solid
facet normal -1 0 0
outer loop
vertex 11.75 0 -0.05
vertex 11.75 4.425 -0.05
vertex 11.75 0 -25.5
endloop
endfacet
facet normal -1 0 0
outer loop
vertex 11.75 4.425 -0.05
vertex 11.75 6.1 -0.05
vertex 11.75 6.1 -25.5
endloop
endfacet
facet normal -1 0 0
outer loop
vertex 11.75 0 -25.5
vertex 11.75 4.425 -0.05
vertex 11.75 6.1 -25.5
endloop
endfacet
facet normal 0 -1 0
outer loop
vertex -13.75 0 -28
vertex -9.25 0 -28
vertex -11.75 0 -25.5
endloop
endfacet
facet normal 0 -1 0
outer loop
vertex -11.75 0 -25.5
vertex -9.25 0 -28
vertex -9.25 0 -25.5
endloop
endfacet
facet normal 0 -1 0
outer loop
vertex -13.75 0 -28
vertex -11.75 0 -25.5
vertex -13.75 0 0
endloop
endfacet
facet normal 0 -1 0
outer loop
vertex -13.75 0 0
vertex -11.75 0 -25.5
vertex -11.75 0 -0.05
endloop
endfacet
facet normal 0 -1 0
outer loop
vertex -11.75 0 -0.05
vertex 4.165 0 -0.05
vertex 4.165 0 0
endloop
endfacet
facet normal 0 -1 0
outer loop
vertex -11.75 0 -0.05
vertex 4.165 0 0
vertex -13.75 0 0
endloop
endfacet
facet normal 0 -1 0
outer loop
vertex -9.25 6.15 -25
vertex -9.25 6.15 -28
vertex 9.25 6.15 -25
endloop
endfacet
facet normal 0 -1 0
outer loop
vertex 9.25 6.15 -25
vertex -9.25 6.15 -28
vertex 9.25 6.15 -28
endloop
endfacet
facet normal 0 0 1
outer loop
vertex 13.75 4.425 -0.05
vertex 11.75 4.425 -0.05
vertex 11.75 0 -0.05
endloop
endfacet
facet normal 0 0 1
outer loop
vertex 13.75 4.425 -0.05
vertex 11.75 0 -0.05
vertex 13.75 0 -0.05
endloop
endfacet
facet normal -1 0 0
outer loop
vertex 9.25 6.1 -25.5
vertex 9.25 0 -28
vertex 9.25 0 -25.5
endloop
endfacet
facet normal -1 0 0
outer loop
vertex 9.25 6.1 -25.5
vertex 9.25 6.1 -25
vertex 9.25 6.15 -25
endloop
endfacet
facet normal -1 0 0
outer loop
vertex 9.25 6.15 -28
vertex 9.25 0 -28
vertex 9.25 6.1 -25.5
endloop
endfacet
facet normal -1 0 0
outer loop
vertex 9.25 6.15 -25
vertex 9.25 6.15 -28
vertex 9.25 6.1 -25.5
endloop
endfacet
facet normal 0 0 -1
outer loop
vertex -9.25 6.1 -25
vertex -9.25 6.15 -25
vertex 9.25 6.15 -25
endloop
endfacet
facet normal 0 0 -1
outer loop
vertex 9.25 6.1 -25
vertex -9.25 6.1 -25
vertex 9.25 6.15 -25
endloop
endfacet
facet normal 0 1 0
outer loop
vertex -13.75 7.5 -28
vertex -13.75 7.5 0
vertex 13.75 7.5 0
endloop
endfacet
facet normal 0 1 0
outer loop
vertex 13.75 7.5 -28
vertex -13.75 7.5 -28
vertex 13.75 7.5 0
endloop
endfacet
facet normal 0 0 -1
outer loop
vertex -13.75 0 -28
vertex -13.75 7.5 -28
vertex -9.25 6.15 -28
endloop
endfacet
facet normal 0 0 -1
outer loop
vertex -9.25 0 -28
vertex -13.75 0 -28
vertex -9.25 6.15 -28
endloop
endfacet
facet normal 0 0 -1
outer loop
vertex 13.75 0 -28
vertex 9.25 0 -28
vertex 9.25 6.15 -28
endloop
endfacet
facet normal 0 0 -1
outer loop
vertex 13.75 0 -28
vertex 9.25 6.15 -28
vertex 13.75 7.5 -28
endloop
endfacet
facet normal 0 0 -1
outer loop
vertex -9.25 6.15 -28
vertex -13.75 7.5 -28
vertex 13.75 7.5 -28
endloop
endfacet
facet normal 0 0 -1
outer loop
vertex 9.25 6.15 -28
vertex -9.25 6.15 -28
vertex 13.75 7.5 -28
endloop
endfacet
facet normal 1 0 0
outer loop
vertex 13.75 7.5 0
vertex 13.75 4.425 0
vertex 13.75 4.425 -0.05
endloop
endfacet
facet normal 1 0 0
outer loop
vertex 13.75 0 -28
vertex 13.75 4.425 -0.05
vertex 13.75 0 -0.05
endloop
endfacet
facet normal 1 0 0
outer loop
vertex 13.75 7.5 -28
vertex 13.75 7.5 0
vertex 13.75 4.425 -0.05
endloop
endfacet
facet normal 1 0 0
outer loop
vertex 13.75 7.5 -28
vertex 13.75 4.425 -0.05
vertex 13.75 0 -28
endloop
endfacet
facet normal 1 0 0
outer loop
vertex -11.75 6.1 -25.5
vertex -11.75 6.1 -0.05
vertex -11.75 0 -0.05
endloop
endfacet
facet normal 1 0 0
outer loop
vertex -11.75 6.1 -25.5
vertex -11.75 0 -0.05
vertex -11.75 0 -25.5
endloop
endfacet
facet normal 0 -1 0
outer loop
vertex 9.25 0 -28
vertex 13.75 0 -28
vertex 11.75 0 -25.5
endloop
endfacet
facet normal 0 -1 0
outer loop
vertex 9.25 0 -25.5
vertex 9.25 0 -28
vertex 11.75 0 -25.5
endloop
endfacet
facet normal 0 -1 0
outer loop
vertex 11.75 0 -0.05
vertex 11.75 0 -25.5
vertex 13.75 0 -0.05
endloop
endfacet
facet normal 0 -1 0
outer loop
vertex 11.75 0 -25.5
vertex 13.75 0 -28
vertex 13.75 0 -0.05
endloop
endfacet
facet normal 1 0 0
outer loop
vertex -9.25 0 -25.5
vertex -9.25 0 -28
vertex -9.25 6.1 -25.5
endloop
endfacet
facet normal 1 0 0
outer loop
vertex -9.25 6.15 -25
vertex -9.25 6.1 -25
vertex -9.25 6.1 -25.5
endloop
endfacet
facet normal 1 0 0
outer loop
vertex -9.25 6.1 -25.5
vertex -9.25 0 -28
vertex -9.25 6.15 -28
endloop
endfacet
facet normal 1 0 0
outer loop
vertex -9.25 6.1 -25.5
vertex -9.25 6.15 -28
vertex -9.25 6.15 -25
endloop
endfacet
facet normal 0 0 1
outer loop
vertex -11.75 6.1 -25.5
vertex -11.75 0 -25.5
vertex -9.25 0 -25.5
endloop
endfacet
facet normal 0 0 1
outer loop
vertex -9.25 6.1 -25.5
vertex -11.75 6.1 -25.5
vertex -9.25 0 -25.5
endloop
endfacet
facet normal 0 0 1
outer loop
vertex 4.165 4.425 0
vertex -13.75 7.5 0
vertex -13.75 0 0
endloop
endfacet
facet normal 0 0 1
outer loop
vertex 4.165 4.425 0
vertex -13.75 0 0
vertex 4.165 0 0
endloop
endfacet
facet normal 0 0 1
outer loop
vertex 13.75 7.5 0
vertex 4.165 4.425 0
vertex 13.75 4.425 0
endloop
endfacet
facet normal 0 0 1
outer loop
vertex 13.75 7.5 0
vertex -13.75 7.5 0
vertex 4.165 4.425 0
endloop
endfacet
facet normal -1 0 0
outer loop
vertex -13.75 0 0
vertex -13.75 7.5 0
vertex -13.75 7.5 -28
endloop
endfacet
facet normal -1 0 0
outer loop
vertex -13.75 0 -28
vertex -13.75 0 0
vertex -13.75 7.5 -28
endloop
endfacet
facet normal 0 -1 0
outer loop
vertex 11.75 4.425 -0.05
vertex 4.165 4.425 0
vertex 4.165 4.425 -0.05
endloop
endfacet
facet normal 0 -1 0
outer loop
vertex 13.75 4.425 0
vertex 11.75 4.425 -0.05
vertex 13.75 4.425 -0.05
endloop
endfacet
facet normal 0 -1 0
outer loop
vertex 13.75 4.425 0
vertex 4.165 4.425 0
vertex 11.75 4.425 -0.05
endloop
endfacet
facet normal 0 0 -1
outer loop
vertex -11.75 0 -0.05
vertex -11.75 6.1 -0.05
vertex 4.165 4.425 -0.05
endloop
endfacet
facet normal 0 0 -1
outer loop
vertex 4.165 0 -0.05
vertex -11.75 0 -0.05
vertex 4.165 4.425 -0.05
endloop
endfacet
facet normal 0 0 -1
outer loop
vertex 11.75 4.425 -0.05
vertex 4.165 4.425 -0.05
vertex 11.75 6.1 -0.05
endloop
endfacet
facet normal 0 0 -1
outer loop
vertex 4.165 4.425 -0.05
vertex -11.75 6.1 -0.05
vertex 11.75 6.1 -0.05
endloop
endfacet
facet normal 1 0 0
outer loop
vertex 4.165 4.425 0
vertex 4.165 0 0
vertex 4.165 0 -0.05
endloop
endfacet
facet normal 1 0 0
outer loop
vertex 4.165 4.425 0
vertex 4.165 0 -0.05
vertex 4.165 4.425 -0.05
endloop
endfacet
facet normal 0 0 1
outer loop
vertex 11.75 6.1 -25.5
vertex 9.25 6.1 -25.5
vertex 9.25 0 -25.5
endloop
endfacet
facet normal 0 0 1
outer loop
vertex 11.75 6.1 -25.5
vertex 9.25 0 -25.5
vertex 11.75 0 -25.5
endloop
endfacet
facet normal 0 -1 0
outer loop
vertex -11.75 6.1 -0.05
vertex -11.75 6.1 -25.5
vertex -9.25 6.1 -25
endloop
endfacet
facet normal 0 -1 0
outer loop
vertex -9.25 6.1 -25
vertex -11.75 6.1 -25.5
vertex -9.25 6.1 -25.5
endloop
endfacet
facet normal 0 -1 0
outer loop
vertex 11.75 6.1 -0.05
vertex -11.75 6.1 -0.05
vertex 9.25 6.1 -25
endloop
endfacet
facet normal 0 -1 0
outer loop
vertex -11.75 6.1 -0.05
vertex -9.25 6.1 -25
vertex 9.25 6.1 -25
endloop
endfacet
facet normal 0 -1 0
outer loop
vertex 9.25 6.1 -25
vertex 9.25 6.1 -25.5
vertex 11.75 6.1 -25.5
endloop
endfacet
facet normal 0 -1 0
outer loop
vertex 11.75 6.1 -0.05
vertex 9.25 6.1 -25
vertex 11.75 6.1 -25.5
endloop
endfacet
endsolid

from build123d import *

# Parameters (mm, degrees)
SKETCH9_W           = 27.5
SKETCH9_H           = 28
BOSS_EXTRUDE2_DEPTH = 7.5
SKETCH10_W          = 23.5
SKETCH10_H          = 25.45
CUT_EXTRUDE1_DEPTH  = 6.1
SKETCH12_W          = 18.5
SKETCH12_H          = 12.3
CUT_EXTRUDE2_DEPTH  = 3
SKETCH11_W          = 9.585282086
SKETCH11_H          = 9.717675131
CUT_EXTRUDE3_DEPTH  = 5.05


with BuildPart() as part:
    # Sketch9 → Boss-Extrude2 (new, symmetric)
    with BuildSketch(Plane(origin=(0, 0, 0), x_dir=(1, 0, 0), z_dir=(0, 1, 0))):
        with Locations((0, 14)):
            Rectangle(SKETCH9_W, SKETCH9_H)
    extrude(amount=BOSS_EXTRUDE2_DEPTH, both=True)

    # Sketch10 → Cut-Extrude1 (cut, symmetric)
    with BuildSketch(Plane(origin=(0, 0, 0), x_dir=(1, 0, 0), z_dir=(0, 1, 0))):
        with Locations((0, 12.775)):
            Rectangle(SKETCH10_W, SKETCH10_H)
    extrude(amount=CUT_EXTRUDE1_DEPTH, both=True, mode=Mode.SUBTRACT)

    # Sketch12 → Cut-Extrude2 (cut)
    with BuildSketch(Plane.XY.offset(-28)):
        Rectangle(SKETCH12_W, SKETCH12_H)
    extrude(amount=CUT_EXTRUDE2_DEPTH, mode=Mode.SUBTRACT)

    # Sketch11 → Cut-Extrude3 (cut)
    with BuildSketch(Plane.XY.offset(5)):
        with Locations((8.957358957, -0.433824782)):
            Rectangle(SKETCH11_W, SKETCH11_H)
    extrude(amount=-CUT_EXTRUDE3_DEPTH, mode=Mode.SUBTRACT)


with BuildPart() as body_2:
    # Split1: the piece on the far side of the plane
    add(part.part)
    split(bisect_by=Plane.ZX, keep=Keep.BOTTOM)


with BuildPart() as part_1:
    add(part.part)

    # Split1
    split(bisect_by=Plane.ZX, keep=Keep.TOP)


solid = part_1.part
